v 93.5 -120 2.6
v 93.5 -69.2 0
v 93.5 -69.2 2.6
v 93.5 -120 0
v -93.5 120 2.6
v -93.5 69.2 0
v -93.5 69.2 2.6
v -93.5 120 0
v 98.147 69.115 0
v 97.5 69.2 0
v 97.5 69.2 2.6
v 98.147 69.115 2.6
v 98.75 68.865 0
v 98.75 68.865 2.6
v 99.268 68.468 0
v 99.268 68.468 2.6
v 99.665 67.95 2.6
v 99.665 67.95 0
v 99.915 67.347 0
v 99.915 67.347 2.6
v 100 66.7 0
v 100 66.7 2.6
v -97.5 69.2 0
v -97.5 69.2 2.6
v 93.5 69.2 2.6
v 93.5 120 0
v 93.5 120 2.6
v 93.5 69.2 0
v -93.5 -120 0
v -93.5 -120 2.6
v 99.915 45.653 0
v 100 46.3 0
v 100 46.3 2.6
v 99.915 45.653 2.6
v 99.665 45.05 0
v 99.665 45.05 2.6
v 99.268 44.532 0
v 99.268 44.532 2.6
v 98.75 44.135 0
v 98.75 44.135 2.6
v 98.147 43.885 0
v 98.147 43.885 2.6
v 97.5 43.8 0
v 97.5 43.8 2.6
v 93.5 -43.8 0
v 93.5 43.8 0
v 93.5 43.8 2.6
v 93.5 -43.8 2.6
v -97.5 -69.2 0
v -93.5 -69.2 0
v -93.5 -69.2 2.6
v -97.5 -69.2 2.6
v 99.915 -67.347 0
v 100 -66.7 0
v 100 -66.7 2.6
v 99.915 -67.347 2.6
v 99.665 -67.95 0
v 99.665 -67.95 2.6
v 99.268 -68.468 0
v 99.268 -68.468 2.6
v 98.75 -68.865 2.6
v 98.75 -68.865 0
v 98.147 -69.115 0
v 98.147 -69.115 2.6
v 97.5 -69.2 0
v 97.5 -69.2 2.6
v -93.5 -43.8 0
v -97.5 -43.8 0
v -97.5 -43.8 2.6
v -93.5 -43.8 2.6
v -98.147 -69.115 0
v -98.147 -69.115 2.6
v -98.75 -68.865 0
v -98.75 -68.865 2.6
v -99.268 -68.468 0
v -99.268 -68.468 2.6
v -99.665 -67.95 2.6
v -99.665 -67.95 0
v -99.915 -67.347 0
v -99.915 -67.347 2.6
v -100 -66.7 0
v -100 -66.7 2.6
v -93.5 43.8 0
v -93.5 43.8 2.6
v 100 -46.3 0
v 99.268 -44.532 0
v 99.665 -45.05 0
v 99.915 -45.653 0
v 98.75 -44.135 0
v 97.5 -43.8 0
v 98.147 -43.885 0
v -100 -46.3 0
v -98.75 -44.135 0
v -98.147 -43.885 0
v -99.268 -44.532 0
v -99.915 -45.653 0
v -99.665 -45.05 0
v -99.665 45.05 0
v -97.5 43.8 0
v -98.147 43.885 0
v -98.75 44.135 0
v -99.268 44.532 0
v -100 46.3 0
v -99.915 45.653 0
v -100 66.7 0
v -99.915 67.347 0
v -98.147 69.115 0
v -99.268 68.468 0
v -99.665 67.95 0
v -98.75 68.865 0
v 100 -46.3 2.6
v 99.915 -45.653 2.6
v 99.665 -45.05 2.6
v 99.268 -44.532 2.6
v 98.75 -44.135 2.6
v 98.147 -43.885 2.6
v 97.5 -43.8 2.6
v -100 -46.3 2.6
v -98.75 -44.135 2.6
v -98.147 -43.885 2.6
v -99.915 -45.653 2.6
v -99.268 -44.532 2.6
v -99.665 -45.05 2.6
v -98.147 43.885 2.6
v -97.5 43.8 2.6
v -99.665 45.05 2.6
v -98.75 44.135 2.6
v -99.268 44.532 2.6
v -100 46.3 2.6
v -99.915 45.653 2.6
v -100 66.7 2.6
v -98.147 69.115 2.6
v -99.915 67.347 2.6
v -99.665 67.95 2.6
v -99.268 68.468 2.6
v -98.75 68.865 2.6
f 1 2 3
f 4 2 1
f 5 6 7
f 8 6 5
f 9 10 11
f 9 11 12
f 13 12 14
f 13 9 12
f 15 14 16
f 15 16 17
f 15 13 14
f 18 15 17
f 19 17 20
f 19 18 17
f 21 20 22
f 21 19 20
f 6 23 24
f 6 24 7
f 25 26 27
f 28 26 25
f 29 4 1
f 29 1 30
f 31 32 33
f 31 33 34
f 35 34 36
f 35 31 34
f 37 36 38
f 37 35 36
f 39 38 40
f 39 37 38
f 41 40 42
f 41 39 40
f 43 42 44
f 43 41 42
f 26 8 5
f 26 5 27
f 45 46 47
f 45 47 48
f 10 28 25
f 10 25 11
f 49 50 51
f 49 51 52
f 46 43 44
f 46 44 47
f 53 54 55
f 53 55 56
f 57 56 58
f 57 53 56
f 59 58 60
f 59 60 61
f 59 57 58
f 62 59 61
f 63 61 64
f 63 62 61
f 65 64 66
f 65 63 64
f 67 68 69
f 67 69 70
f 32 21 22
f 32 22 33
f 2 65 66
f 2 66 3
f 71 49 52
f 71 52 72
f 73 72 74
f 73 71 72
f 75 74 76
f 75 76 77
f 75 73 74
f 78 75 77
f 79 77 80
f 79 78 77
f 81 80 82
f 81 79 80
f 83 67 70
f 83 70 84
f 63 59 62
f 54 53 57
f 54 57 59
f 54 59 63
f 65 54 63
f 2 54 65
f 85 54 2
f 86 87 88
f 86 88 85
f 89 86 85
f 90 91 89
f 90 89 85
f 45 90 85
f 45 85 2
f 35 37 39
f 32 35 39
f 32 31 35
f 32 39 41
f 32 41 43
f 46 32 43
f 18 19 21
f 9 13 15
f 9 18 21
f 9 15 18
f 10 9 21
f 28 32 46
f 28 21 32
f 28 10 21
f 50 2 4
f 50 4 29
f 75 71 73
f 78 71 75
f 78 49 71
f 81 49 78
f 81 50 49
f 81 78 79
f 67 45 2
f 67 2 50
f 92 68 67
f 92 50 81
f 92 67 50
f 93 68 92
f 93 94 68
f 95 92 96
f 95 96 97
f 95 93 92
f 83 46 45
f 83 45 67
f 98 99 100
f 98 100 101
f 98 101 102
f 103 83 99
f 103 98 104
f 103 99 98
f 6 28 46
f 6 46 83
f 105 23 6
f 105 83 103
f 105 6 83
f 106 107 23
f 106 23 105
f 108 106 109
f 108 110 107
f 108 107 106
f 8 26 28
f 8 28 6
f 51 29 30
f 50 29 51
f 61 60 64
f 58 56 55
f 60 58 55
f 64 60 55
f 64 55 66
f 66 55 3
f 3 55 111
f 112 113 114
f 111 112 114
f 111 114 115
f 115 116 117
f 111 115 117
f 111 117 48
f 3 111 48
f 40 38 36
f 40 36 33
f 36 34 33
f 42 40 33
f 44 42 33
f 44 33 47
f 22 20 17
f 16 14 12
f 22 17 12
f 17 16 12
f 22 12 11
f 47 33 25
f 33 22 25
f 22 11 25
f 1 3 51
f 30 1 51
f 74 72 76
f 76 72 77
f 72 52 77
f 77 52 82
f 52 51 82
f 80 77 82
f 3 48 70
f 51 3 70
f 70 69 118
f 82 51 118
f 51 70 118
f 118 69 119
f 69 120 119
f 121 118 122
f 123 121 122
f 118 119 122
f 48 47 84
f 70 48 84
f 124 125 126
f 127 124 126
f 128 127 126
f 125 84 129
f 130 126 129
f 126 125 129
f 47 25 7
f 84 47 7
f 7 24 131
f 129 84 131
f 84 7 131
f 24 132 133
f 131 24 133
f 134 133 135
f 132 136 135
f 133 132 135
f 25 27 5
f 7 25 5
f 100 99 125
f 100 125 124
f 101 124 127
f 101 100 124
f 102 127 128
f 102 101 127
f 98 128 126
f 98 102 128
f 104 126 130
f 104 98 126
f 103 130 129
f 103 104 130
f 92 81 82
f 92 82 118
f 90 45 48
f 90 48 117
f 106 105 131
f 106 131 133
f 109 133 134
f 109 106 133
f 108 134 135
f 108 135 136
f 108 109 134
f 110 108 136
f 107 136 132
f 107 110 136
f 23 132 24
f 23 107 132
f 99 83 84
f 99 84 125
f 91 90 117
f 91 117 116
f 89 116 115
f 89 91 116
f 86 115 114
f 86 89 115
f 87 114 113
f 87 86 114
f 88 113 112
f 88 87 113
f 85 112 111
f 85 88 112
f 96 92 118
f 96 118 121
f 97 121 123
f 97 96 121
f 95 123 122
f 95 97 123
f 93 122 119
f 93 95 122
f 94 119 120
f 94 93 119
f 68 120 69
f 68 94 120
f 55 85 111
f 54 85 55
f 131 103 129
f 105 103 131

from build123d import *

# Parameters (mm, degrees)
BOSS_EXTRUDE1_DEPTH = 2.6


with BuildPart() as part:
    # Model → Boss-Extrude1 (new body)
    with BuildSketch(Plane.XY):
        with BuildLine():
            Line((-97.5, -43.8), (-93.5, -43.8))
            Line((-93.5, -43.8), (-93.5, 43.8))
            Line((-93.5, 43.8), (-97.5, 43.8))
            ThreePointArc((-97.5, 43.8), (-99.267766953, 44.532233047), (-100, 46.3))
            Line((-100, 46.3), (-100, 66.7))
            ThreePointArc((-100, 66.7), (-99.267766953, 68.467766953), (-97.5, 69.2))
            Line((-97.5, 69.2), (-93.5, 69.2))
            Line((-93.5, 69.2), (-93.5, 120))
            Line((-93.5, 120), (93.5, 120))
            Line((93.5, 120), (93.5, 69.2))
            Line((93.5, 69.2), (97.5, 69.2))
            ThreePointArc((97.5, 69.2), (99.267766953, 68.467766953), (100, 66.7))
            Line((100, 66.7), (100, 46.3))
            ThreePointArc((100, 46.3), (99.267766953, 44.532233047), (97.5, 43.8))
            Line((97.5, 43.8), (93.5, 43.8))
            Line((93.5, 43.8), (93.5, -43.8))
            Line((93.5, -43.8), (97.5, -43.8))
            ThreePointArc((97.5, -43.8), (99.267766953, -44.532233047), (100, -46.3))
            Line((100, -46.3), (100, -66.7))
            ThreePointArc((100, -66.7), (99.267766953, -68.467766953), (97.5, -69.2))
            Line((97.5, -69.2), (93.5, -69.2))
            Line((93.5, -69.2), (93.5, -120))
            Line((93.5, -120), (-93.5, -120))
            Line((-93.5, -120), (-93.5, -69.2))
            Line((-93.5, -69.2), (-97.5, -69.2))
            ThreePointArc((-97.5, -69.2), (-99.267766953, -68.467766953), (-100, -66.7))
            Line((-100, -66.7), (-100, -46.3))
            ThreePointArc((-100, -46.3), (-99.267766953, -44.532233047), (-97.5, -43.8))
        make_face()
    extrude(amount=BOSS_EXTRUDE1_DEPTH)


solid = part.part
